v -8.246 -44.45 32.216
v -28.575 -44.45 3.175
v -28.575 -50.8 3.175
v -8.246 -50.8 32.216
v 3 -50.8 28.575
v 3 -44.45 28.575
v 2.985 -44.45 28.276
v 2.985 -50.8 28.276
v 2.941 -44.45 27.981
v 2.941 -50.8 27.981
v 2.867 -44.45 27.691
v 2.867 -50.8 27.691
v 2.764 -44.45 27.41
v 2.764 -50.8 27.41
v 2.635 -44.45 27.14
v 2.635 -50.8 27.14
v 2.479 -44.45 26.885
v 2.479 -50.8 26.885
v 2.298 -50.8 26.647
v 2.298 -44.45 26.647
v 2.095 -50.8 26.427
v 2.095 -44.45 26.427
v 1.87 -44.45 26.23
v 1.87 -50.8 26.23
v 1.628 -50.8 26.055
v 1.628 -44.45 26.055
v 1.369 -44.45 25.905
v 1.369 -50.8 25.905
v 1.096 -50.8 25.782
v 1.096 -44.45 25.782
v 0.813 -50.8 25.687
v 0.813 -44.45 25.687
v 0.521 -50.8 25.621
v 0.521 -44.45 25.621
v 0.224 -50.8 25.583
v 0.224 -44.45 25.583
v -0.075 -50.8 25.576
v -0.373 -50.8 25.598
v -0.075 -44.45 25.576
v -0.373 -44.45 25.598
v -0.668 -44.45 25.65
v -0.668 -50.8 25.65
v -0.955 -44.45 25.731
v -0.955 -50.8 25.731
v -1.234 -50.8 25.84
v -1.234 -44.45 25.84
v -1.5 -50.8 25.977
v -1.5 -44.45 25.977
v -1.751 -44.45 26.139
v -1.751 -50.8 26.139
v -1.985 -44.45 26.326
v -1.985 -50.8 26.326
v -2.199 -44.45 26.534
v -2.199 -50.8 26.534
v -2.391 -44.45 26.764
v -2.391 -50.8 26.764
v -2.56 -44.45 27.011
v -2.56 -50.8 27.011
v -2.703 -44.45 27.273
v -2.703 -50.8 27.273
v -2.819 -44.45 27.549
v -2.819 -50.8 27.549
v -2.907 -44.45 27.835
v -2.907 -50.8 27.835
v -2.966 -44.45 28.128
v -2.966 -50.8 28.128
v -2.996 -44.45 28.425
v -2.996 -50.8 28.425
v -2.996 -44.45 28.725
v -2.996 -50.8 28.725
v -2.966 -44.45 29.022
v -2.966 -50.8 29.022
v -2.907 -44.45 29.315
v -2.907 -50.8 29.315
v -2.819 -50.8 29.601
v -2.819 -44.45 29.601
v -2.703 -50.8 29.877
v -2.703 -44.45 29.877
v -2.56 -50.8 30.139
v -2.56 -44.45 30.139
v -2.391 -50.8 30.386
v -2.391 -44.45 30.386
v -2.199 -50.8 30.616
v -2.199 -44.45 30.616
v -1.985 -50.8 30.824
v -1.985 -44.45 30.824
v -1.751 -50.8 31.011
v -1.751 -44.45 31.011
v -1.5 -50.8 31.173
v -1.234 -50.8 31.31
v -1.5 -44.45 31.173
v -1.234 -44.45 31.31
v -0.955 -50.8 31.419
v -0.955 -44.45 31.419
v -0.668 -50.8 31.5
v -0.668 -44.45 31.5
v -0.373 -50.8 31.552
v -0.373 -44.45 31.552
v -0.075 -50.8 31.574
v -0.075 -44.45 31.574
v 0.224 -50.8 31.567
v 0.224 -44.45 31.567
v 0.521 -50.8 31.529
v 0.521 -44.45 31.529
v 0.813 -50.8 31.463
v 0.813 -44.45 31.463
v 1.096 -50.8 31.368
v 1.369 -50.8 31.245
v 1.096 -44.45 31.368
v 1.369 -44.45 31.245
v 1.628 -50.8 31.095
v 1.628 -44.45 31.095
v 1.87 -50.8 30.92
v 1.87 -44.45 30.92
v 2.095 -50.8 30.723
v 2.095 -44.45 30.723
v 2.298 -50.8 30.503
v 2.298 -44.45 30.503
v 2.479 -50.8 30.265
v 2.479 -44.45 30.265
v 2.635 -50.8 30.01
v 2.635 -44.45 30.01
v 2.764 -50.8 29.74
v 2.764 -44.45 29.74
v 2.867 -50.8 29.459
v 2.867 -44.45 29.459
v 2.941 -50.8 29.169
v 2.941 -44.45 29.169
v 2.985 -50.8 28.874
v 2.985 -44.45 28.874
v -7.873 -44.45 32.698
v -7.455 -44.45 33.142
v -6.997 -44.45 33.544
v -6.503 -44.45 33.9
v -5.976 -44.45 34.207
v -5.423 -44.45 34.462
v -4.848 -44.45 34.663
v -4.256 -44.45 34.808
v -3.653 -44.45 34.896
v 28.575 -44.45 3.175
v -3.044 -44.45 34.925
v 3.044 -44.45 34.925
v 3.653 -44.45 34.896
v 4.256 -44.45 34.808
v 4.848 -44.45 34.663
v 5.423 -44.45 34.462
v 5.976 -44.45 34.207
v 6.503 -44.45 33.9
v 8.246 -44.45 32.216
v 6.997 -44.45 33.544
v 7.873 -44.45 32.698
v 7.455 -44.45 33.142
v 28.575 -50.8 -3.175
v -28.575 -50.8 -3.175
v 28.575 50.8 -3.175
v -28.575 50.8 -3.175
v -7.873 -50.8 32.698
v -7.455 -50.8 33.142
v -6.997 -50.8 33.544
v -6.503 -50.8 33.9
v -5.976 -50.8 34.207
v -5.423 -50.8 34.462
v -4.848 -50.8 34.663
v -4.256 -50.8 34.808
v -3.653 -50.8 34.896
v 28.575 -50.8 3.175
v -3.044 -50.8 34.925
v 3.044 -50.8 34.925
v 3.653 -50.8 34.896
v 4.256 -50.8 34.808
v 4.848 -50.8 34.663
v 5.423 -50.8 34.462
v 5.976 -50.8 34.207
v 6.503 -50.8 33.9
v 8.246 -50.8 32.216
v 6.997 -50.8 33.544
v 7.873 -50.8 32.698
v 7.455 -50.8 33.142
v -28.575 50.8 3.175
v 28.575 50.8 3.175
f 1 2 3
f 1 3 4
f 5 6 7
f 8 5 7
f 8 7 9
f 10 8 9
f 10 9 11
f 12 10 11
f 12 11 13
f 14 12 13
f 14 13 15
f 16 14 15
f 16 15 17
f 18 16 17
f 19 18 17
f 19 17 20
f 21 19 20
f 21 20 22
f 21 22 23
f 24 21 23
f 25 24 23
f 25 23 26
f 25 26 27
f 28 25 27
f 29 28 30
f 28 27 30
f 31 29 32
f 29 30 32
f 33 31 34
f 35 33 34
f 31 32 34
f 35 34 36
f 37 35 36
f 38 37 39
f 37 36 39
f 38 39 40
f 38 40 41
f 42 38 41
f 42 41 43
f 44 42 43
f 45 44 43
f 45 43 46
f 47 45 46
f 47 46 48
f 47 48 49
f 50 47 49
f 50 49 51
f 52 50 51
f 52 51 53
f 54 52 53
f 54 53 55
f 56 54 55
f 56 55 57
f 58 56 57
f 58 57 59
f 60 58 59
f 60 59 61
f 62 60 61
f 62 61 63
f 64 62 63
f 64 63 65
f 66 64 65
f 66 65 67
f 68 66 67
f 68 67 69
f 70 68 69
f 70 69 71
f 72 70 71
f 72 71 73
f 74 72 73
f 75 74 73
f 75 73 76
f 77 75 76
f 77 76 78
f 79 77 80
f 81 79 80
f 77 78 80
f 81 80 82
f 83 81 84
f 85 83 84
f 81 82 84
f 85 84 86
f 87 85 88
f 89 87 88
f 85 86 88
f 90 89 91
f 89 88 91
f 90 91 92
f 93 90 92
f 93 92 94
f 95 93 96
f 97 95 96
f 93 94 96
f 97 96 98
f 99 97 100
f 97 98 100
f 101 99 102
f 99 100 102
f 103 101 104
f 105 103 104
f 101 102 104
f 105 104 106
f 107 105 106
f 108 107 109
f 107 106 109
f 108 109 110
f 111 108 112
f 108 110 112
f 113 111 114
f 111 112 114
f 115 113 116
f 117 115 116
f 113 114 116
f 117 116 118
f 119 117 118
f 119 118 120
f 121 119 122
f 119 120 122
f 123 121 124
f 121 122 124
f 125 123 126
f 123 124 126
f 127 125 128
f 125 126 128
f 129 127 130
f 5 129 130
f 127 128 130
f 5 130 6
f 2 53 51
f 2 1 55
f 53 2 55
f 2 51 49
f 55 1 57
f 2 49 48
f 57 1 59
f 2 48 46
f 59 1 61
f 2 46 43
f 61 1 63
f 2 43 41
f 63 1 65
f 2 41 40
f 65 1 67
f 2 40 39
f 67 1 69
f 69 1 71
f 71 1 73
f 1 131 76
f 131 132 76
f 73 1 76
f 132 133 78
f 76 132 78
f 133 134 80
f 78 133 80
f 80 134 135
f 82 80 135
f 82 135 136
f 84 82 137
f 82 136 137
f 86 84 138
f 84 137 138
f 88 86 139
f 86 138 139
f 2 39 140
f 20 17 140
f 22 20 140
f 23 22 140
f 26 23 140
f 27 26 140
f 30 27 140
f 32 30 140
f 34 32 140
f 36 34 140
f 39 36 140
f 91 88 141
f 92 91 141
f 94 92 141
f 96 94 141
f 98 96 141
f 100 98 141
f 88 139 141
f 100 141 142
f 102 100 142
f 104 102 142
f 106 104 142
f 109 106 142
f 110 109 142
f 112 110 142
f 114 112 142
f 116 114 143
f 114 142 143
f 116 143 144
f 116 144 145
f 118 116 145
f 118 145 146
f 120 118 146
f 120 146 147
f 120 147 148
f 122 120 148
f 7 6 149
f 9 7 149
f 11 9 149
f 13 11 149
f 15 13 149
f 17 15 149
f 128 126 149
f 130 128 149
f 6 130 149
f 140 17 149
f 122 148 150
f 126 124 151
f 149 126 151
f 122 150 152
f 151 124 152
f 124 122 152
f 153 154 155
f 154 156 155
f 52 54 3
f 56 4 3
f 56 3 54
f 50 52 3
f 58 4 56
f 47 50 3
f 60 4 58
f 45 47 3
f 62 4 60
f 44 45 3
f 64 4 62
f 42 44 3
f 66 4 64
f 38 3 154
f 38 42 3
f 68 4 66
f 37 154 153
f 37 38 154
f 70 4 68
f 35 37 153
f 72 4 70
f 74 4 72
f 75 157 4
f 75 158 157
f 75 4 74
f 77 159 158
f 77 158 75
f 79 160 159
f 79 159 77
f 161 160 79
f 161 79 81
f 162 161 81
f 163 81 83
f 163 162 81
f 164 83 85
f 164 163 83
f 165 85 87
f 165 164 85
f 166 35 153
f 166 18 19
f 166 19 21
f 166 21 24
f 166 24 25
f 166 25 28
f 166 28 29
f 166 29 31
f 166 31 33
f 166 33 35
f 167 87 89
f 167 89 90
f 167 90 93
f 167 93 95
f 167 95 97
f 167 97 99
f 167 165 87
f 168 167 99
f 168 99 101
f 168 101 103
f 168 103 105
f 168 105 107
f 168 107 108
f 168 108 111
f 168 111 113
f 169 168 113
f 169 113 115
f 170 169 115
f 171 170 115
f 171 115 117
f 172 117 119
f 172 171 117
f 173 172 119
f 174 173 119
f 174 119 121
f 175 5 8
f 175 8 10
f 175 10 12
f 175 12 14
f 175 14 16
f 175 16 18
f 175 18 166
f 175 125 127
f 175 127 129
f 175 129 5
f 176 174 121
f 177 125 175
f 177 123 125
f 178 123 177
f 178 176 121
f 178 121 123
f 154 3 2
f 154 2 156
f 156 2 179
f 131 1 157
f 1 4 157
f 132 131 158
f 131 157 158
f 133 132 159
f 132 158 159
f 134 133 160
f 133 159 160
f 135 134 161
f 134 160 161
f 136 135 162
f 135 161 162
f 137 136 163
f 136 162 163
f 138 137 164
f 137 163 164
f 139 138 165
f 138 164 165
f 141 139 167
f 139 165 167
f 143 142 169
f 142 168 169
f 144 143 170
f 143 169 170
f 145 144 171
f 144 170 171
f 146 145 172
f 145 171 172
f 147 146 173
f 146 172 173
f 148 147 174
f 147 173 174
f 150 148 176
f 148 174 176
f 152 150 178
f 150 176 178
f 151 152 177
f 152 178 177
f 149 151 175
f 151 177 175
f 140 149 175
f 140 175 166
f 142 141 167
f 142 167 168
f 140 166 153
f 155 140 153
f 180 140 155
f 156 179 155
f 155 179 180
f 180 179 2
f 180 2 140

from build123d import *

# Parameters (mm, degrees)
SKETCH1_W           = 57.15
SKETCH1_H           = 101.6
BOSS_EXTRUDE1_DEPTH = 3.175
SKETCH2_W           = 57.15
SKETCH2_H           = 57.15
BOSS_EXTRUDE2_DEPTH = 6.35
SKETCH4_R           = 3
CUT_EXTRUDE2_DEPTH  = 7.35
CUT_EXTRUDE3_DEPTH  = 7.35
FILLET1_R           = 6.35


with BuildPart() as part:
    # Sketch1 → Boss-Extrude1 (new body, symmetric)
    with BuildSketch(Plane.XY):
        Rectangle(SKETCH1_W, SKETCH1_H)
    extrude(amount=BOSS_EXTRUDE1_DEPTH, both=True)

    # Sketch2 → Boss-Extrude2 (add)
    with BuildSketch(Plane.XZ.offset(50.8)):
        with Locations((0, 25.4)):
            Rectangle(SKETCH2_W, SKETCH2_H)
    extrude(amount=-BOSS_EXTRUDE2_DEPTH)

    # Sketch4 → Cut-Extrude2 (cut, through all)
    with BuildSketch(Plane(origin=(0, -44.45, 0), x_dir=(1, 0, 0), z_dir=(0, 1, 0))):
        with Locations((0, -28.575)):
            Circle(SKETCH4_R)
    extrude(amount=-CUT_EXTRUDE2_DEPTH, mode=Mode.SUBTRACT)

    # Sketch5 → Cut-Extrude3 (cut, through all)
    with BuildSketch(Plane(origin=(0, -44.45, 0), x_dir=(1, 0, 0), z_dir=(0, 1, 0))):
        Polygon((-28.575, -3.175), (-6.35, -34.925), (6.35, -34.925), (28.575, -3.175), (28.575, -53.975), (-28.575, -53.975), align=None)
    extrude(amount=-CUT_EXTRUDE3_DEPTH, mode=Mode.SUBTRACT)

    # Fillet1
    fillet1_edges = [part.edges().sort_by_distance(p)[0] for p in [
        (-6.35, -47.625, 34.925),
        (6.35, -47.625, 34.925),
    ]]
    fillet(fillet1_edges, radius=FILLET1_R)


solid = part.part
